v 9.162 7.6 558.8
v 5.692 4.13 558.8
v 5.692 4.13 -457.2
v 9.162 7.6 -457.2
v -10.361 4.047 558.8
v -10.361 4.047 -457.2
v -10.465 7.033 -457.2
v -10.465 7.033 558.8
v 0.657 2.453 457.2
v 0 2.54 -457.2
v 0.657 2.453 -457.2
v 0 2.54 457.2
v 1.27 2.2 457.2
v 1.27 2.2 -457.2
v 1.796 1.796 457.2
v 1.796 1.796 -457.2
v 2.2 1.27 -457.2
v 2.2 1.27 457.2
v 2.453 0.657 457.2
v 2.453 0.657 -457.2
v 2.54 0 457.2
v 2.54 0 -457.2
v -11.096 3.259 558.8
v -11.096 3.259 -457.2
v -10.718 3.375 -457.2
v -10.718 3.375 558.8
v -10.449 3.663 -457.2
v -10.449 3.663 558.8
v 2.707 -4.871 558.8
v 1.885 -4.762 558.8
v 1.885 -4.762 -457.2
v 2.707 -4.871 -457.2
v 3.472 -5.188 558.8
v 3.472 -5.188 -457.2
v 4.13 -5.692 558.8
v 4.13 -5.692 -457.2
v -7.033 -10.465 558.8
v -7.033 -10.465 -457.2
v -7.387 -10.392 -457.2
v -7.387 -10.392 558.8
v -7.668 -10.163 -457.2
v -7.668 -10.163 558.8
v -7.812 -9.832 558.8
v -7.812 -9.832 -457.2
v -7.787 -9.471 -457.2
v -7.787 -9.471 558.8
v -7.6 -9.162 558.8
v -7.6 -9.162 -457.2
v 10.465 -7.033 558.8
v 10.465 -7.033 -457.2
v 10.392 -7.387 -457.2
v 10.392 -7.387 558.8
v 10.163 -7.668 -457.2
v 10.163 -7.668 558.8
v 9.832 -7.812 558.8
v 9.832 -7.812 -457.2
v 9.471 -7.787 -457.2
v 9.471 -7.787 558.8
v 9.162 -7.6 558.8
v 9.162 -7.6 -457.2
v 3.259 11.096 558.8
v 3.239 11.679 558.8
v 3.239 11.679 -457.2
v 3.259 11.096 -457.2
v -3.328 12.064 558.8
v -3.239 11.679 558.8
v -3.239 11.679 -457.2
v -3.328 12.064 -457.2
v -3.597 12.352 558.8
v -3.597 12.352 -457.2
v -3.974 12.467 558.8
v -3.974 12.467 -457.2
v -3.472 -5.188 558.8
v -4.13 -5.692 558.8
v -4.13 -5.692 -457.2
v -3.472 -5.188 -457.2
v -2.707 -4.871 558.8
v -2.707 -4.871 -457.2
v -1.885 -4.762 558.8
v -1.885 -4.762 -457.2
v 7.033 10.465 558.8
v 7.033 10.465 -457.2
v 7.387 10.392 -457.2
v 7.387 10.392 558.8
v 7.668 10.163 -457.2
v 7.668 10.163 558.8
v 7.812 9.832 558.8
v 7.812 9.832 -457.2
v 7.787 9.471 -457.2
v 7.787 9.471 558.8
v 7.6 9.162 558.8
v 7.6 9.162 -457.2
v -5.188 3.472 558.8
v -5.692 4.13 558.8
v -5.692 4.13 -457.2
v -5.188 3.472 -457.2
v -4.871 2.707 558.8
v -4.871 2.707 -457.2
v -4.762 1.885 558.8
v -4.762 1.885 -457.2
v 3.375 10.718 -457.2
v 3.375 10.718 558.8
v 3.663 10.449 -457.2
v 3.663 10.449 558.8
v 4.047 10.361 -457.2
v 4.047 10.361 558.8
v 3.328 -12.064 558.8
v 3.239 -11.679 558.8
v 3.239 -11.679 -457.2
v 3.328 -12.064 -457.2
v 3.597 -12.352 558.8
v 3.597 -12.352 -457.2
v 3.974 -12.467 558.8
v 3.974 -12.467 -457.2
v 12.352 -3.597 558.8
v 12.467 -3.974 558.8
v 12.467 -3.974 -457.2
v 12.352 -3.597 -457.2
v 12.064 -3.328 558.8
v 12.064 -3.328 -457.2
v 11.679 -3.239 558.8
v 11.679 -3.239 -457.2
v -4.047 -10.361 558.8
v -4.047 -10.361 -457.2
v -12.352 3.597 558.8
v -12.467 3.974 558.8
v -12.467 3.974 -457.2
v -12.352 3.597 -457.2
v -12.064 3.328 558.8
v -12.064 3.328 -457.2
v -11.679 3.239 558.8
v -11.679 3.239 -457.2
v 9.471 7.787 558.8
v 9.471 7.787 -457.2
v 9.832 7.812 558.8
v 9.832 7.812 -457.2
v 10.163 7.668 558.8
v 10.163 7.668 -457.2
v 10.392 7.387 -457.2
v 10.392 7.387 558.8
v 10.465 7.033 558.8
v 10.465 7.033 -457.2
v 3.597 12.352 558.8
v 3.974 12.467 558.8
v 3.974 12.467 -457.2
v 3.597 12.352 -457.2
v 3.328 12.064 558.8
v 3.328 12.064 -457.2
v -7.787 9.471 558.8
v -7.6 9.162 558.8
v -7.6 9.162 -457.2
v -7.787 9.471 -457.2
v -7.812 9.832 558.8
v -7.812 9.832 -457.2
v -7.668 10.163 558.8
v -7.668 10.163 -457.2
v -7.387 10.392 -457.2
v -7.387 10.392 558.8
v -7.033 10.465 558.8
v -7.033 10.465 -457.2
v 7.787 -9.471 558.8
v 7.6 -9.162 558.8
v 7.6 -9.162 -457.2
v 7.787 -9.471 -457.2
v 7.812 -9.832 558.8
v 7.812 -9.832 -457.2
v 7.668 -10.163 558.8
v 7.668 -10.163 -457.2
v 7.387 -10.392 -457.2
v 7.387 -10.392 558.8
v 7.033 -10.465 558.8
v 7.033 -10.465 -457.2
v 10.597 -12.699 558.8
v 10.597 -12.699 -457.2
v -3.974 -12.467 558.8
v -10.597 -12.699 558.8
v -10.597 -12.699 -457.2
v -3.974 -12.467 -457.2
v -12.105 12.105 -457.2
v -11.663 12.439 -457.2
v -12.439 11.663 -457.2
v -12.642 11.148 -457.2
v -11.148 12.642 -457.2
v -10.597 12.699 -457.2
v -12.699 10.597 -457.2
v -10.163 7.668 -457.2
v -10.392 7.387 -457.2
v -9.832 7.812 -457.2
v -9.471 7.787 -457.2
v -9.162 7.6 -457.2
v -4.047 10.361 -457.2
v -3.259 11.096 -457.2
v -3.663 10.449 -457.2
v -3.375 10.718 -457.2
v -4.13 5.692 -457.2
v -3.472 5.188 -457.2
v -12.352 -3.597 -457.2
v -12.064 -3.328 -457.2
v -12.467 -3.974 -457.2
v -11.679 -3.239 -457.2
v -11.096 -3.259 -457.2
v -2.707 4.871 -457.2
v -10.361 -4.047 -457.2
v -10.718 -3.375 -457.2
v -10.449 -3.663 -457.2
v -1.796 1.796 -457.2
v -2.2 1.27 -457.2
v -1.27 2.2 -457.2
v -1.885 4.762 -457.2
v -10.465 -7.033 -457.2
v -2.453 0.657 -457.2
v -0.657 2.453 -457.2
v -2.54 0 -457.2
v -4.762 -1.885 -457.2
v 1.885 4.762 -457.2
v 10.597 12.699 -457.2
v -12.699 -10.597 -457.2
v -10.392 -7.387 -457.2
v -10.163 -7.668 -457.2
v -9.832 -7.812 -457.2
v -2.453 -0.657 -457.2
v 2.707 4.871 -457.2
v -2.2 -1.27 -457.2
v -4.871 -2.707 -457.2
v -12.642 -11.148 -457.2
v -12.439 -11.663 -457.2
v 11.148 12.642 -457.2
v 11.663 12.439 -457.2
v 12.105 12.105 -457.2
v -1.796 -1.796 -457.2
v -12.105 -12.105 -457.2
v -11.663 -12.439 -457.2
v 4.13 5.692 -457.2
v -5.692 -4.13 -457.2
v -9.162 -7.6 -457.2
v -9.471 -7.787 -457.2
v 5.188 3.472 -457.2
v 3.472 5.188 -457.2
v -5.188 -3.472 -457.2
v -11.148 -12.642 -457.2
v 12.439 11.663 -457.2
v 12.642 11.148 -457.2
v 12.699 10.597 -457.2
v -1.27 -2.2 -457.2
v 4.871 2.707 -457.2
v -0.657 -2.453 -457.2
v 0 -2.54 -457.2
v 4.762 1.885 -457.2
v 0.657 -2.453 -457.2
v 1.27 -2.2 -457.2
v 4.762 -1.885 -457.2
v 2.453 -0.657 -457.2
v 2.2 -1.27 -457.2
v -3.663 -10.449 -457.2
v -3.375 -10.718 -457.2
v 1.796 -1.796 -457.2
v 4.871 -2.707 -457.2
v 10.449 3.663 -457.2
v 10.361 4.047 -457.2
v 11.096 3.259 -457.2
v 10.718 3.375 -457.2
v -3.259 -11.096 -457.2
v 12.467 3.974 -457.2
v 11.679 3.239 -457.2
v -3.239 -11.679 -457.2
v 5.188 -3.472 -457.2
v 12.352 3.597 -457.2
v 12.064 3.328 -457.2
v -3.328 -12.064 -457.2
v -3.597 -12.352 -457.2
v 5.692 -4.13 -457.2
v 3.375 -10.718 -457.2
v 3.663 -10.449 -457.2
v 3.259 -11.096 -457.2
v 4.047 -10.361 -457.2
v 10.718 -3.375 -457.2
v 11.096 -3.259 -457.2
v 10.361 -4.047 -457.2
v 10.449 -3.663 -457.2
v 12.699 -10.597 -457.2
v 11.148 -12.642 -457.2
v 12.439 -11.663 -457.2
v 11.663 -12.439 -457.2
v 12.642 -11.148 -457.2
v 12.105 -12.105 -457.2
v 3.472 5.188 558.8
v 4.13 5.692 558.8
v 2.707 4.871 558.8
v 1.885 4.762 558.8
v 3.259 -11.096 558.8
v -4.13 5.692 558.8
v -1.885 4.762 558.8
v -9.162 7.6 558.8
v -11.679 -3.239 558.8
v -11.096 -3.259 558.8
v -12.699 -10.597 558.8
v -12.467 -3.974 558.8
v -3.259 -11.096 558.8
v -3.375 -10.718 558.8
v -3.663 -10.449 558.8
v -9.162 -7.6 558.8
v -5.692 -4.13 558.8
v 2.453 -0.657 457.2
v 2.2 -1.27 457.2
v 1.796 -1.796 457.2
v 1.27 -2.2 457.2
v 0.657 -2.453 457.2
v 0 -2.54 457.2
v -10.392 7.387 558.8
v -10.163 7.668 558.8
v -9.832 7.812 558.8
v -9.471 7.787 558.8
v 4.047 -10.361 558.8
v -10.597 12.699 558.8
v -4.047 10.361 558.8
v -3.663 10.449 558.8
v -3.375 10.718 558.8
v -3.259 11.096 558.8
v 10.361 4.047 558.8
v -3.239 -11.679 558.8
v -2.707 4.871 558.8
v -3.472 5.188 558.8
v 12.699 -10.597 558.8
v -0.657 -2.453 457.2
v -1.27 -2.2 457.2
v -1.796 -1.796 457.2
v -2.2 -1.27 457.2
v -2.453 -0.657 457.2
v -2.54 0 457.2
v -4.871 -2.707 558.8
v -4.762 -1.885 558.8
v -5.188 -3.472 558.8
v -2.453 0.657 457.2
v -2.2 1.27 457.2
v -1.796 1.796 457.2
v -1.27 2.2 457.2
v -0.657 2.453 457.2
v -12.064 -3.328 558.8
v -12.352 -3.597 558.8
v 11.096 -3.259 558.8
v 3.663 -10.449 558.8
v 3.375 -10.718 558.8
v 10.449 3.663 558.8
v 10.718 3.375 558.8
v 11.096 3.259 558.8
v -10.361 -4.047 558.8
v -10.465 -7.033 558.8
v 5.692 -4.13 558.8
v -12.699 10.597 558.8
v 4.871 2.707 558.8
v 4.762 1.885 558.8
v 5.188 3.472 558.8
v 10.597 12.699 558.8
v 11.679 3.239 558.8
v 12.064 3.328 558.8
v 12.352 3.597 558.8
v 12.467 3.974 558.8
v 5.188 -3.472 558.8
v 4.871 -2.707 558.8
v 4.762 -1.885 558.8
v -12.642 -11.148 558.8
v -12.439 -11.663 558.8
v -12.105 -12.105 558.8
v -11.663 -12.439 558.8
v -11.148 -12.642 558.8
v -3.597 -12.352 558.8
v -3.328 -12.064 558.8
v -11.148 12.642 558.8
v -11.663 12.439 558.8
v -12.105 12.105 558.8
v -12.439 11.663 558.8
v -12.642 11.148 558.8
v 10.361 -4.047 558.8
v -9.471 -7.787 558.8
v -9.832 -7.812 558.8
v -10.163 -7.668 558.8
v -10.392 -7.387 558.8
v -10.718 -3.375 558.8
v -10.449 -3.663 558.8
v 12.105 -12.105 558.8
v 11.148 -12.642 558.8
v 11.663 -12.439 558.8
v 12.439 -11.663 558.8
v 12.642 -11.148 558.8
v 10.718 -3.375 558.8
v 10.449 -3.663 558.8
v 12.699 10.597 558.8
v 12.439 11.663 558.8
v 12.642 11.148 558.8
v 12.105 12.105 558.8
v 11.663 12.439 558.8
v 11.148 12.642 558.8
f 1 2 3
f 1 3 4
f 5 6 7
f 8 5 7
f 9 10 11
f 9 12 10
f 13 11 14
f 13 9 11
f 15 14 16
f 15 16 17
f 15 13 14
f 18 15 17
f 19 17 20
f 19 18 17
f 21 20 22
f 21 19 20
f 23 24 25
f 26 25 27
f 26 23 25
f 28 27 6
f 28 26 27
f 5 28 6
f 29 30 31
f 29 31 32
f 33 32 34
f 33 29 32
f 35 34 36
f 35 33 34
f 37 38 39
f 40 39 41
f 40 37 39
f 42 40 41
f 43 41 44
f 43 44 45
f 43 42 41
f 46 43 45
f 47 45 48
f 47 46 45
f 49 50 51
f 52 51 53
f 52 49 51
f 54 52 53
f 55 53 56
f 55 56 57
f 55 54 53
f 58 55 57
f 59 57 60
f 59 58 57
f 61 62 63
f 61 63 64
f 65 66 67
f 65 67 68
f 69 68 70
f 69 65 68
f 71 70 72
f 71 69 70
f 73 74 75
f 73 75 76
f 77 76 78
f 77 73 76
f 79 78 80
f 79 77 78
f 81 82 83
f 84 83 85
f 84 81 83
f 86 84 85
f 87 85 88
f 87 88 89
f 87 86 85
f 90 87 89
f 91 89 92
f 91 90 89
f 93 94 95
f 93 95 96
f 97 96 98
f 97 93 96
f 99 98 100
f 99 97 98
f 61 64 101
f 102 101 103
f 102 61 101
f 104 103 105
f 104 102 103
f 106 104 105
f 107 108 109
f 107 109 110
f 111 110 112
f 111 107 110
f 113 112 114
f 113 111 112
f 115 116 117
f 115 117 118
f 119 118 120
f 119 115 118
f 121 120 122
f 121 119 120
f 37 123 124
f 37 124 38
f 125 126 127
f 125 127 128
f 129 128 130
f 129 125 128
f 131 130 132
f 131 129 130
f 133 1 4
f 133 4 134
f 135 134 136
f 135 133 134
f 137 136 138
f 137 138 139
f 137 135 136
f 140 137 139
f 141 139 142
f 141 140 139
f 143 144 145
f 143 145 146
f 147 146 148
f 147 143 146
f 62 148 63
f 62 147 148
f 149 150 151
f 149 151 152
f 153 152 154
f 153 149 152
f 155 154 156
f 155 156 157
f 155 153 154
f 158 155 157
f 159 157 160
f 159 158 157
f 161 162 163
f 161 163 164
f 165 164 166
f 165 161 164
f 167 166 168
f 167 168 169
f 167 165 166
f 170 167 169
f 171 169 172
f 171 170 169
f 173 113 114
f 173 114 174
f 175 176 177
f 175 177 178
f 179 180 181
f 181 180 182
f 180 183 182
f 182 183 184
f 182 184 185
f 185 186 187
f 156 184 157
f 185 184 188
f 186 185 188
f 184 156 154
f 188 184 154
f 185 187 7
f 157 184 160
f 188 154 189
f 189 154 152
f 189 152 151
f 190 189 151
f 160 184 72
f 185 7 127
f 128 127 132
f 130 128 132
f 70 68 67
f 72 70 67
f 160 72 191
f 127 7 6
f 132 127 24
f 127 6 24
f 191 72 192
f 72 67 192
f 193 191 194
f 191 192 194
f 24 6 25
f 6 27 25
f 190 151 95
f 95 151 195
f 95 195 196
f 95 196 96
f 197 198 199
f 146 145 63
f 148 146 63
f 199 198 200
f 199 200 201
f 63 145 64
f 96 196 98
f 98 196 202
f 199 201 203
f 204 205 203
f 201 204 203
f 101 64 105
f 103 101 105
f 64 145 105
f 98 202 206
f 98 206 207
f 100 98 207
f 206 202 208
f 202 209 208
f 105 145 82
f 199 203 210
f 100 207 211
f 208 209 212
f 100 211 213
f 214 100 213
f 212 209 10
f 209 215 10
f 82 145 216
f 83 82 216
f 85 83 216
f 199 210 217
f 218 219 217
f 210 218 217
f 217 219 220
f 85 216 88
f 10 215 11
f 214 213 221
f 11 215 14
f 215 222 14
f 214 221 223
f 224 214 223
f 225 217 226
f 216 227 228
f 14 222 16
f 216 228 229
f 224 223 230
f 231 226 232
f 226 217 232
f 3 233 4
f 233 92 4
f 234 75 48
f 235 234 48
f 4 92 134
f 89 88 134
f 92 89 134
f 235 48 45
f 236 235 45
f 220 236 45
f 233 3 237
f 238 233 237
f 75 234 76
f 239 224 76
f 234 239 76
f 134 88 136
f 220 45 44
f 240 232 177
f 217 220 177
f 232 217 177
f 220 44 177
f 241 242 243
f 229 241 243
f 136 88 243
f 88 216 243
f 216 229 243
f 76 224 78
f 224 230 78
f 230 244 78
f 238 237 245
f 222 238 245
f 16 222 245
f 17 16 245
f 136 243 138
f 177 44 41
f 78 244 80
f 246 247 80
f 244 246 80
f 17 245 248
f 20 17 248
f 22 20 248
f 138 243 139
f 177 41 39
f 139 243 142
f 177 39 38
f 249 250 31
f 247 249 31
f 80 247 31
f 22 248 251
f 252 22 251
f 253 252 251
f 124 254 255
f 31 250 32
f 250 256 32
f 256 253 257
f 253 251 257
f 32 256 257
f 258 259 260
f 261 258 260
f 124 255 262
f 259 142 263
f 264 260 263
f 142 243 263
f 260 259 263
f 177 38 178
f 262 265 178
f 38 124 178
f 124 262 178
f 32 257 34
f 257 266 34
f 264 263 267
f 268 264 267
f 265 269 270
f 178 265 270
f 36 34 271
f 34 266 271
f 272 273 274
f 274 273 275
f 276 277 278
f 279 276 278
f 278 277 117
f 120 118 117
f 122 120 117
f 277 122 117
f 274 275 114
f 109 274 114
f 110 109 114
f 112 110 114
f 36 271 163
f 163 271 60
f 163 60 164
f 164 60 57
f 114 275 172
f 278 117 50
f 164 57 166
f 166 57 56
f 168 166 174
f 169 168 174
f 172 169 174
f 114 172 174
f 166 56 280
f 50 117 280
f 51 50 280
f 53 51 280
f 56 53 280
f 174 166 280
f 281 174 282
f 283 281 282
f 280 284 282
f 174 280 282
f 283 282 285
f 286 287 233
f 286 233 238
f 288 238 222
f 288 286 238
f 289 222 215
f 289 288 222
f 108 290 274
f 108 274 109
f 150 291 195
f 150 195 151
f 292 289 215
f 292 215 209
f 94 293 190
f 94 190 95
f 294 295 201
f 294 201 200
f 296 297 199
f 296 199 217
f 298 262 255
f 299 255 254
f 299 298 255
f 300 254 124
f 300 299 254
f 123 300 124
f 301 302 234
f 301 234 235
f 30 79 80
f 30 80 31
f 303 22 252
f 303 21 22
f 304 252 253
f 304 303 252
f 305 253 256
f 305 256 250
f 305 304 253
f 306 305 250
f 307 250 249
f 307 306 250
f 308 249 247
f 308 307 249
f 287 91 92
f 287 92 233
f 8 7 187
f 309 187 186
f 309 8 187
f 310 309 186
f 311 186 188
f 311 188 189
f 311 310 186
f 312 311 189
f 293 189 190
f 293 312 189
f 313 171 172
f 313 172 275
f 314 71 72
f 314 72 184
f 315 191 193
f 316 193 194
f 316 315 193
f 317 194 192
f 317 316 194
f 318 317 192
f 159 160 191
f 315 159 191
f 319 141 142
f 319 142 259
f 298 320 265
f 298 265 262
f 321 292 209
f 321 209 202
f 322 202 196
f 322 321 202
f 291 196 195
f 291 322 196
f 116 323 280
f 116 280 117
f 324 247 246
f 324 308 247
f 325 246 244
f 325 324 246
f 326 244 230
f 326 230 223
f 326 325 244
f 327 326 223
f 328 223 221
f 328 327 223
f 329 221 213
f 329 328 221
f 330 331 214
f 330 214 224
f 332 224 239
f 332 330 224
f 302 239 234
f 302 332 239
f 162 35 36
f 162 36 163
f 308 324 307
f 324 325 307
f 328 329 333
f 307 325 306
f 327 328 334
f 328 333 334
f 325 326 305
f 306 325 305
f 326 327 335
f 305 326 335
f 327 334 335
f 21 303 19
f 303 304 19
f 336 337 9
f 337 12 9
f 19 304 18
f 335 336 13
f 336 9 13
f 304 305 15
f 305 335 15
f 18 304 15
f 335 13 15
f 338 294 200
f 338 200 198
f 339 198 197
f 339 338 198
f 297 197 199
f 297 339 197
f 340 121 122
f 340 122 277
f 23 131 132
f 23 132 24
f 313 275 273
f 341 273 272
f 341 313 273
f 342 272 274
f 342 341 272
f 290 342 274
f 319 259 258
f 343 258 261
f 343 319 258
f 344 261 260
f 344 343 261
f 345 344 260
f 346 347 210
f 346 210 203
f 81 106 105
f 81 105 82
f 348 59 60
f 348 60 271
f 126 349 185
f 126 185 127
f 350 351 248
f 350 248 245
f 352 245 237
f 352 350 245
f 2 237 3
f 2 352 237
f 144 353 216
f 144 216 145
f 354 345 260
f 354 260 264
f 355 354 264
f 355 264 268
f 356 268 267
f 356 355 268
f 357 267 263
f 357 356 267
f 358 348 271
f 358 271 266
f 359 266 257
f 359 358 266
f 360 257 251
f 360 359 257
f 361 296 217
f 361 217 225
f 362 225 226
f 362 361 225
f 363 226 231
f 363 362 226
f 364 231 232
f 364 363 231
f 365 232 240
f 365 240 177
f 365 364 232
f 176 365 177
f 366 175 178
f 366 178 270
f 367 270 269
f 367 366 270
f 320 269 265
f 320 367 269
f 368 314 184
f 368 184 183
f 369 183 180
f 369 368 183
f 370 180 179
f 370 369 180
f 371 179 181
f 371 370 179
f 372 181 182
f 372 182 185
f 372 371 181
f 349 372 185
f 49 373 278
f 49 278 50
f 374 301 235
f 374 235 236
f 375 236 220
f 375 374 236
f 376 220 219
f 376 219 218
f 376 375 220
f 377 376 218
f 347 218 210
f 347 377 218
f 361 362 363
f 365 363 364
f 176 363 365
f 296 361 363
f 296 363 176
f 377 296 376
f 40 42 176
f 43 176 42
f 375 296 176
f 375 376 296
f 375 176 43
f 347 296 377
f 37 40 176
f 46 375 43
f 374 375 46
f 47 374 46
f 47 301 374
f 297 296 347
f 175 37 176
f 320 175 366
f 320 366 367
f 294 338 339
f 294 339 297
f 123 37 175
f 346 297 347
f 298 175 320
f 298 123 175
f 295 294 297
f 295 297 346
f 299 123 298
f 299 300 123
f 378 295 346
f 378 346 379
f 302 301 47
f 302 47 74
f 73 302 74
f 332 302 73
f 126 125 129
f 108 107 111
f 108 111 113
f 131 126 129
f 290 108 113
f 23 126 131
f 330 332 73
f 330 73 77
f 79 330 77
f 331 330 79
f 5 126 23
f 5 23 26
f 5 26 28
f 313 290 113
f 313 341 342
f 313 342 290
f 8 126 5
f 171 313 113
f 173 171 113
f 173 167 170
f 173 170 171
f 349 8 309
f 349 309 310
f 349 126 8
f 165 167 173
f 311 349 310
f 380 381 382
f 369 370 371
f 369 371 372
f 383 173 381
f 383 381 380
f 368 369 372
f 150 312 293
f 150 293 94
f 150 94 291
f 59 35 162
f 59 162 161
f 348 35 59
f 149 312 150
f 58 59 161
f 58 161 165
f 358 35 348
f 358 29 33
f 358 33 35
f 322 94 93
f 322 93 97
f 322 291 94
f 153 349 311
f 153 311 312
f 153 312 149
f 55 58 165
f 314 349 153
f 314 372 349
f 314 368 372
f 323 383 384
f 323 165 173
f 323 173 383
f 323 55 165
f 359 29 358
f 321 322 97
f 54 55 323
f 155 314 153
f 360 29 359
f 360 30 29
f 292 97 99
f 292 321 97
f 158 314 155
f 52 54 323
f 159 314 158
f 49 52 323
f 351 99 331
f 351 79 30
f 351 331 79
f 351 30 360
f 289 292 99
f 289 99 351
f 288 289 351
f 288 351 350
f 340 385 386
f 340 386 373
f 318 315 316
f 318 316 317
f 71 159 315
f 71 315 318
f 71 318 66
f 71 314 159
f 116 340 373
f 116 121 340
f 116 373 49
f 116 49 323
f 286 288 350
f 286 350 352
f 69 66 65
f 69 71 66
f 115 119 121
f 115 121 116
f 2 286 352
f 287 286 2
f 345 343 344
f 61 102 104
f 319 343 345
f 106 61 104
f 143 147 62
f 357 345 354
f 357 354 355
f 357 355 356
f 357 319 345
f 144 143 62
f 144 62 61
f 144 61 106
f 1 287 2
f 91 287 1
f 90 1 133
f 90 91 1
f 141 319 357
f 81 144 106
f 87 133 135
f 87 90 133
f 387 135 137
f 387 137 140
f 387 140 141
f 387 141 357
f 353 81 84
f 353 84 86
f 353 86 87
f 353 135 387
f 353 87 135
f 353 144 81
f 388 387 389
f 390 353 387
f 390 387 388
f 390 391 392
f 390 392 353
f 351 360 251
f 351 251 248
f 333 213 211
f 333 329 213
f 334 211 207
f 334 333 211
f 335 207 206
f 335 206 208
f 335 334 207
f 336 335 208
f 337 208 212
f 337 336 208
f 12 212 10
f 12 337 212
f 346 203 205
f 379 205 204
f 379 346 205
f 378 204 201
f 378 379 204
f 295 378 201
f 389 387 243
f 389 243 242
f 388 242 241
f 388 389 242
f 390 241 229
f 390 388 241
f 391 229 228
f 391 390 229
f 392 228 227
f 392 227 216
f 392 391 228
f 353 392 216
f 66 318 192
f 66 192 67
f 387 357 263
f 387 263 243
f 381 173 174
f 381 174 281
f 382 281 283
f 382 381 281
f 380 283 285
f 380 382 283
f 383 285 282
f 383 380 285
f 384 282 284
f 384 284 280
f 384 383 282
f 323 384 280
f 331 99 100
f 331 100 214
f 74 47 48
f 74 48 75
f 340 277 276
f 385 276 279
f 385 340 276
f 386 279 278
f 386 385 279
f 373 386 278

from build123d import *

# Parameters (mm, degrees)
BOSS_EXTRUDE1_DEPTH = 457.2
CIRPATTERN1_COUNT   = 4
BOSS_EXTRUDE2_START = 101.6
BOSS_EXTRUDE2_DEPTH = 101.6


with BuildPart() as part:
    # Sketch3 → Boss-Extrude1 (new, symmetric)
    with BuildSketch(Plane.XY):
        with BuildLine():
            Line((0, 4.7625), (-1.884807374, 4.7625))
            ThreePointArc((-1.884807374, 4.7625), (-3.099827272, 5.004182484), (-4.129871405, 5.69243597))
            Line((-4.129871405, 5.69243597), (-7.599623114, 9.162187679))
            ThreePointArc((-7.599623114, 9.162187679), (-7.759888701, 10.006330839), (-7.033220609, 10.464824259))
            Line((-7.033220609, 10.464824259), (-4.047481702, 10.360559959))
            ThreePointArc((-4.047481702, 10.360559959), (-3.501205536, 10.564804249), (-3.259352476, 11.095502353))
            Line((-3.259352476, 11.095502353), (-3.23896419, 11.679346474))
            ThreePointArc((-3.23896419, 11.679346474), (-3.443208479, 12.225622641), (-3.973906584, 12.467475701))
            Line((-3.973906584, 12.467475701), (-10.597084223, 12.698762161))
            ThreePointArc((-10.597084223, 12.698762161), (-12.104840979, 12.104840979), (-12.698762161, 10.597084223))
            Line((-12.698762161, 10.597084223), (-12.467475701, 3.973906584))
            ThreePointArc((-12.467475701, 3.973906584), (-12.225622641, 3.443208479), (-11.679346474, 3.23896419))
            Line((-11.679346474, 3.23896419), (-11.095502353, 3.259352476))
            ThreePointArc((-11.095502353, 3.259352476), (-10.564804249, 3.501205536), (-10.360559959, 4.047481702))
            Line((-10.360559959, 4.047481702), (-10.464824259, 7.033220609))
            ThreePointArc((-10.464824259, 7.033220609), (-10.006330839, 7.759888701), (-9.162187679, 7.599623114))
            Line((-9.162187679, 7.599623114), (-5.69243597, 4.129871405))
            ThreePointArc((-5.69243597, 4.129871405), (-5.004182484, 3.099827272), (-4.7625, 1.884807374))
            Line((-4.7625, 1.884807374), (-4.7625, 0))
            Line((-4.7625, 0), (-2.54, 0))
            ThreePointArc((-2.54, 0), (-1.796051224, 1.796051224), (0, 2.54))
            Line((0, 2.54), (0, 4.7625))
        make_face()
    boss_extrude1 = extrude(amount=BOSS_EXTRUDE1_DEPTH, both=True)

    # CirPattern1: Boss-Extrude1 ×4 about axis
    cirpattern1_axis = Axis((0, 0, 0), (0, 0, 1))
    for i in range(1, CIRPATTERN1_COUNT):
        add(boss_extrude1.rotate(cirpattern1_axis, i * 360 / CIRPATTERN1_COUNT))

    # Sketch4 → Boss-Extrude2 (add)
    with BuildSketch(Plane.XY.offset(457.2).offset(BOSS_EXTRUDE2_START)):
        with BuildLine():
            Line((1.884807374, 4.7625), (-1.884807374, 4.7625))
            ThreePointArc((-1.884807374, 4.7625), (-3.099827272, 5.004182484), (-4.129871405, 5.69243597))
            Line((-4.129871405, 5.69243597), (-7.599623114, 9.162187679))
            ThreePointArc((-7.599623114, 9.162187679), (-7.759888701, 10.006330839), (-7.033220609, 10.464824259))
            Line((-7.033220609, 10.464824259), (-4.047481702, 10.360559959))
            ThreePointArc((-4.047481702, 10.360559959), (-3.501205536, 10.564804249), (-3.259352476, 11.095502353))
            Line((-3.259352476, 11.095502353), (-3.23896419, 11.679346474))
            ThreePointArc((-3.23896419, 11.679346474), (-3.443208479, 12.225622641), (-3.973906584, 12.467475701))
            Line((-3.973906584, 12.467475701), (-10.597084223, 12.698762161))
            ThreePointArc((-10.597084223, 12.698762161), (-12.104840979, 12.104840979), (-12.698762161, 10.597084223))
            Line((-12.698762161, 10.597084223), (-12.467475701, 3.973906584))
            ThreePointArc((-12.467475701, 3.973906584), (-12.225622641, 3.443208479), (-11.679346474, 3.23896419))
            Line((-11.679346474, 3.23896419), (-11.095502353, 3.259352476))
            ThreePointArc((-11.095502353, 3.259352476), (-10.564804249, 3.501205536), (-10.360559959, 4.047481702))
            Line((-10.360559959, 4.047481702), (-10.464824259, 7.033220609))
            ThreePointArc((-10.464824259, 7.033220609), (-10.006330839, 7.759888701), (-9.162187679, 7.599623114))
            Line((-9.162187679, 7.599623114), (-5.69243597, 4.129871405))
            ThreePointArc((-5.69243597, 4.129871405), (-5.004182484, 3.099827272), (-4.7625, 1.884807374))
            Line((-4.7625, 1.884807374), (-4.7625, -1.884807374))
            ThreePointArc((-4.7625, -1.884807374), (-5.004182484, -3.099827272), (-5.69243597, -4.129871405))
            Line((-5.69243597, -4.129871405), (-9.162187679, -7.599623114))
            ThreePointArc((-9.162187679, -7.599623114), (-10.006330839, -7.759888701), (-10.464824259, -7.033220609))
            Line((-10.464824259, -7.033220609), (-10.360559959, -4.047481702))
            ThreePointArc((-10.360559959, -4.047481702), (-10.564804249, -3.501205536), (-11.095502353, -3.259352476))
            Line((-11.095502353, -3.259352476), (-11.679346474, -3.23896419))
            ThreePointArc((-11.679346474, -3.23896419), (-12.225622641, -3.443208479), (-12.467475701, -3.973906584))
            Line((-12.467475701, -3.973906584), (-12.698762161, -10.597084223))
            ThreePointArc((-12.698762161, -10.597084223), (-12.104840979, -12.104840979), (-10.597084223, -12.698762161))
            Line((-10.597084223, -12.698762161), (-3.973906584, -12.467475701))
            ThreePointArc((-3.973906584, -12.467475701), (-3.443208479, -12.225622641), (-3.23896419, -11.679346474))
            Line((-3.23896419, -11.679346474), (-3.259352476, -11.095502353))
            ThreePointArc((-3.259352476, -11.095502353), (-3.501205536, -10.564804249), (-4.047481702, -10.360559959))
            Line((-4.047481702, -10.360559959), (-7.033220609, -10.464824259))
            ThreePointArc((-7.033220609, -10.464824259), (-7.759888701, -10.006330839), (-7.599623114, -9.162187679))
            Line((-7.599623114, -9.162187679), (-4.129871405, -5.69243597))
            ThreePointArc((-4.129871405, -5.69243597), (-3.099827272, -5.004182484), (-1.884807374, -4.7625))
            Line((-1.884807374, -4.7625), (1.884807374, -4.7625))
            ThreePointArc((1.884807374, -4.7625), (3.099827272, -5.004182484), (4.129871405, -5.69243597))
            Line((4.129871405, -5.69243597), (7.599623114, -9.162187679))
            ThreePointArc((7.599623114, -9.162187679), (7.759888701, -10.006330839), (7.033220609, -10.464824259))
            Line((7.033220609, -10.464824259), (4.047481702, -10.360559959))
            ThreePointArc((4.047481702, -10.360559959), (3.501205536, -10.564804249), (3.259352476, -11.095502353))
            Line((3.259352476, -11.095502353), (3.23896419, -11.679346474))
            ThreePointArc((3.23896419, -11.679346474), (3.443208479, -12.225622641), (3.973906584, -12.467475701))
            Line((3.973906584, -12.467475701), (10.597084223, -12.698762161))
            ThreePointArc((10.597084223, -12.698762161), (12.104840979, -12.104840979), (12.698762161, -10.597084223))
            Line((12.698762161, -10.597084223), (12.467475701, -3.973906584))
            ThreePointArc((12.467475701, -3.973906584), (12.225622641, -3.443208479), (11.679346474, -3.23896419))
            Line((11.679346474, -3.23896419), (11.095502353, -3.259352476))
            ThreePointArc((11.095502353, -3.259352476), (10.564804249, -3.501205536), (10.360559959, -4.047481702))
            Line((10.360559959, -4.047481702), (10.464824259, -7.033220609))
            ThreePointArc((10.464824259, -7.033220609), (10.006330839, -7.759888701), (9.162187679, -7.599623114))
            Line((9.162187679, -7.599623114), (5.69243597, -4.129871405))
            ThreePointArc((5.69243597, -4.129871405), (5.004182484, -3.099827272), (4.7625, -1.884807374))
            Line((4.7625, -1.884807374), (4.7625, 1.884807374))
            ThreePointArc((4.7625, 1.884807374), (5.004182484, 3.099827272), (5.69243597, 4.129871405))
            Line((5.69243597, 4.129871405), (9.162187679, 7.599623114))
            ThreePointArc((9.162187679, 7.599623114), (10.006330839, 7.759888701), (10.464824259, 7.033220609))
            Line((10.464824259, 7.033220609), (10.360559959, 4.047481702))
            ThreePointArc((10.360559959, 4.047481702), (10.564804249, 3.501205536), (11.095502353, 3.259352476))
            Line((11.095502353, 3.259352476), (11.679346474, 3.23896419))
            ThreePointArc((11.679346474, 3.23896419), (12.225622641, 3.443208479), (12.467475701, 3.973906584))
            Line((12.467475701, 3.973906584), (12.698762161, 10.597084223))
            ThreePointArc((12.698762161, 10.597084223), (12.104840979, 12.104840979), (10.597084223, 12.698762161))
            Line((10.597084223, 12.698762161), (3.973906584, 12.467475701))
            ThreePointArc((3.973906584, 12.467475701), (3.443208479, 12.225622641), (3.23896419, 11.679346474))
            Line((3.23896419, 11.679346474), (3.259352476, 11.095502353))
            ThreePointArc((3.259352476, 11.095502353), (3.501205536, 10.564804249), (4.047481702, 10.360559959))
            Line((4.047481702, 10.360559959), (7.033220609, 10.464824259))
            ThreePointArc((7.033220609, 10.464824259), (7.759888701, 10.006330839), (7.599623114, 9.162187679))
            Line((7.599623114, 9.162187679), (4.129871405, 5.69243597))
            ThreePointArc((4.129871405, 5.69243597), (3.099827272, 5.004182484), (1.884807374, 4.7625))
        make_face()
    extrude(amount=-BOSS_EXTRUDE2_DEPTH)


solid = part.part
